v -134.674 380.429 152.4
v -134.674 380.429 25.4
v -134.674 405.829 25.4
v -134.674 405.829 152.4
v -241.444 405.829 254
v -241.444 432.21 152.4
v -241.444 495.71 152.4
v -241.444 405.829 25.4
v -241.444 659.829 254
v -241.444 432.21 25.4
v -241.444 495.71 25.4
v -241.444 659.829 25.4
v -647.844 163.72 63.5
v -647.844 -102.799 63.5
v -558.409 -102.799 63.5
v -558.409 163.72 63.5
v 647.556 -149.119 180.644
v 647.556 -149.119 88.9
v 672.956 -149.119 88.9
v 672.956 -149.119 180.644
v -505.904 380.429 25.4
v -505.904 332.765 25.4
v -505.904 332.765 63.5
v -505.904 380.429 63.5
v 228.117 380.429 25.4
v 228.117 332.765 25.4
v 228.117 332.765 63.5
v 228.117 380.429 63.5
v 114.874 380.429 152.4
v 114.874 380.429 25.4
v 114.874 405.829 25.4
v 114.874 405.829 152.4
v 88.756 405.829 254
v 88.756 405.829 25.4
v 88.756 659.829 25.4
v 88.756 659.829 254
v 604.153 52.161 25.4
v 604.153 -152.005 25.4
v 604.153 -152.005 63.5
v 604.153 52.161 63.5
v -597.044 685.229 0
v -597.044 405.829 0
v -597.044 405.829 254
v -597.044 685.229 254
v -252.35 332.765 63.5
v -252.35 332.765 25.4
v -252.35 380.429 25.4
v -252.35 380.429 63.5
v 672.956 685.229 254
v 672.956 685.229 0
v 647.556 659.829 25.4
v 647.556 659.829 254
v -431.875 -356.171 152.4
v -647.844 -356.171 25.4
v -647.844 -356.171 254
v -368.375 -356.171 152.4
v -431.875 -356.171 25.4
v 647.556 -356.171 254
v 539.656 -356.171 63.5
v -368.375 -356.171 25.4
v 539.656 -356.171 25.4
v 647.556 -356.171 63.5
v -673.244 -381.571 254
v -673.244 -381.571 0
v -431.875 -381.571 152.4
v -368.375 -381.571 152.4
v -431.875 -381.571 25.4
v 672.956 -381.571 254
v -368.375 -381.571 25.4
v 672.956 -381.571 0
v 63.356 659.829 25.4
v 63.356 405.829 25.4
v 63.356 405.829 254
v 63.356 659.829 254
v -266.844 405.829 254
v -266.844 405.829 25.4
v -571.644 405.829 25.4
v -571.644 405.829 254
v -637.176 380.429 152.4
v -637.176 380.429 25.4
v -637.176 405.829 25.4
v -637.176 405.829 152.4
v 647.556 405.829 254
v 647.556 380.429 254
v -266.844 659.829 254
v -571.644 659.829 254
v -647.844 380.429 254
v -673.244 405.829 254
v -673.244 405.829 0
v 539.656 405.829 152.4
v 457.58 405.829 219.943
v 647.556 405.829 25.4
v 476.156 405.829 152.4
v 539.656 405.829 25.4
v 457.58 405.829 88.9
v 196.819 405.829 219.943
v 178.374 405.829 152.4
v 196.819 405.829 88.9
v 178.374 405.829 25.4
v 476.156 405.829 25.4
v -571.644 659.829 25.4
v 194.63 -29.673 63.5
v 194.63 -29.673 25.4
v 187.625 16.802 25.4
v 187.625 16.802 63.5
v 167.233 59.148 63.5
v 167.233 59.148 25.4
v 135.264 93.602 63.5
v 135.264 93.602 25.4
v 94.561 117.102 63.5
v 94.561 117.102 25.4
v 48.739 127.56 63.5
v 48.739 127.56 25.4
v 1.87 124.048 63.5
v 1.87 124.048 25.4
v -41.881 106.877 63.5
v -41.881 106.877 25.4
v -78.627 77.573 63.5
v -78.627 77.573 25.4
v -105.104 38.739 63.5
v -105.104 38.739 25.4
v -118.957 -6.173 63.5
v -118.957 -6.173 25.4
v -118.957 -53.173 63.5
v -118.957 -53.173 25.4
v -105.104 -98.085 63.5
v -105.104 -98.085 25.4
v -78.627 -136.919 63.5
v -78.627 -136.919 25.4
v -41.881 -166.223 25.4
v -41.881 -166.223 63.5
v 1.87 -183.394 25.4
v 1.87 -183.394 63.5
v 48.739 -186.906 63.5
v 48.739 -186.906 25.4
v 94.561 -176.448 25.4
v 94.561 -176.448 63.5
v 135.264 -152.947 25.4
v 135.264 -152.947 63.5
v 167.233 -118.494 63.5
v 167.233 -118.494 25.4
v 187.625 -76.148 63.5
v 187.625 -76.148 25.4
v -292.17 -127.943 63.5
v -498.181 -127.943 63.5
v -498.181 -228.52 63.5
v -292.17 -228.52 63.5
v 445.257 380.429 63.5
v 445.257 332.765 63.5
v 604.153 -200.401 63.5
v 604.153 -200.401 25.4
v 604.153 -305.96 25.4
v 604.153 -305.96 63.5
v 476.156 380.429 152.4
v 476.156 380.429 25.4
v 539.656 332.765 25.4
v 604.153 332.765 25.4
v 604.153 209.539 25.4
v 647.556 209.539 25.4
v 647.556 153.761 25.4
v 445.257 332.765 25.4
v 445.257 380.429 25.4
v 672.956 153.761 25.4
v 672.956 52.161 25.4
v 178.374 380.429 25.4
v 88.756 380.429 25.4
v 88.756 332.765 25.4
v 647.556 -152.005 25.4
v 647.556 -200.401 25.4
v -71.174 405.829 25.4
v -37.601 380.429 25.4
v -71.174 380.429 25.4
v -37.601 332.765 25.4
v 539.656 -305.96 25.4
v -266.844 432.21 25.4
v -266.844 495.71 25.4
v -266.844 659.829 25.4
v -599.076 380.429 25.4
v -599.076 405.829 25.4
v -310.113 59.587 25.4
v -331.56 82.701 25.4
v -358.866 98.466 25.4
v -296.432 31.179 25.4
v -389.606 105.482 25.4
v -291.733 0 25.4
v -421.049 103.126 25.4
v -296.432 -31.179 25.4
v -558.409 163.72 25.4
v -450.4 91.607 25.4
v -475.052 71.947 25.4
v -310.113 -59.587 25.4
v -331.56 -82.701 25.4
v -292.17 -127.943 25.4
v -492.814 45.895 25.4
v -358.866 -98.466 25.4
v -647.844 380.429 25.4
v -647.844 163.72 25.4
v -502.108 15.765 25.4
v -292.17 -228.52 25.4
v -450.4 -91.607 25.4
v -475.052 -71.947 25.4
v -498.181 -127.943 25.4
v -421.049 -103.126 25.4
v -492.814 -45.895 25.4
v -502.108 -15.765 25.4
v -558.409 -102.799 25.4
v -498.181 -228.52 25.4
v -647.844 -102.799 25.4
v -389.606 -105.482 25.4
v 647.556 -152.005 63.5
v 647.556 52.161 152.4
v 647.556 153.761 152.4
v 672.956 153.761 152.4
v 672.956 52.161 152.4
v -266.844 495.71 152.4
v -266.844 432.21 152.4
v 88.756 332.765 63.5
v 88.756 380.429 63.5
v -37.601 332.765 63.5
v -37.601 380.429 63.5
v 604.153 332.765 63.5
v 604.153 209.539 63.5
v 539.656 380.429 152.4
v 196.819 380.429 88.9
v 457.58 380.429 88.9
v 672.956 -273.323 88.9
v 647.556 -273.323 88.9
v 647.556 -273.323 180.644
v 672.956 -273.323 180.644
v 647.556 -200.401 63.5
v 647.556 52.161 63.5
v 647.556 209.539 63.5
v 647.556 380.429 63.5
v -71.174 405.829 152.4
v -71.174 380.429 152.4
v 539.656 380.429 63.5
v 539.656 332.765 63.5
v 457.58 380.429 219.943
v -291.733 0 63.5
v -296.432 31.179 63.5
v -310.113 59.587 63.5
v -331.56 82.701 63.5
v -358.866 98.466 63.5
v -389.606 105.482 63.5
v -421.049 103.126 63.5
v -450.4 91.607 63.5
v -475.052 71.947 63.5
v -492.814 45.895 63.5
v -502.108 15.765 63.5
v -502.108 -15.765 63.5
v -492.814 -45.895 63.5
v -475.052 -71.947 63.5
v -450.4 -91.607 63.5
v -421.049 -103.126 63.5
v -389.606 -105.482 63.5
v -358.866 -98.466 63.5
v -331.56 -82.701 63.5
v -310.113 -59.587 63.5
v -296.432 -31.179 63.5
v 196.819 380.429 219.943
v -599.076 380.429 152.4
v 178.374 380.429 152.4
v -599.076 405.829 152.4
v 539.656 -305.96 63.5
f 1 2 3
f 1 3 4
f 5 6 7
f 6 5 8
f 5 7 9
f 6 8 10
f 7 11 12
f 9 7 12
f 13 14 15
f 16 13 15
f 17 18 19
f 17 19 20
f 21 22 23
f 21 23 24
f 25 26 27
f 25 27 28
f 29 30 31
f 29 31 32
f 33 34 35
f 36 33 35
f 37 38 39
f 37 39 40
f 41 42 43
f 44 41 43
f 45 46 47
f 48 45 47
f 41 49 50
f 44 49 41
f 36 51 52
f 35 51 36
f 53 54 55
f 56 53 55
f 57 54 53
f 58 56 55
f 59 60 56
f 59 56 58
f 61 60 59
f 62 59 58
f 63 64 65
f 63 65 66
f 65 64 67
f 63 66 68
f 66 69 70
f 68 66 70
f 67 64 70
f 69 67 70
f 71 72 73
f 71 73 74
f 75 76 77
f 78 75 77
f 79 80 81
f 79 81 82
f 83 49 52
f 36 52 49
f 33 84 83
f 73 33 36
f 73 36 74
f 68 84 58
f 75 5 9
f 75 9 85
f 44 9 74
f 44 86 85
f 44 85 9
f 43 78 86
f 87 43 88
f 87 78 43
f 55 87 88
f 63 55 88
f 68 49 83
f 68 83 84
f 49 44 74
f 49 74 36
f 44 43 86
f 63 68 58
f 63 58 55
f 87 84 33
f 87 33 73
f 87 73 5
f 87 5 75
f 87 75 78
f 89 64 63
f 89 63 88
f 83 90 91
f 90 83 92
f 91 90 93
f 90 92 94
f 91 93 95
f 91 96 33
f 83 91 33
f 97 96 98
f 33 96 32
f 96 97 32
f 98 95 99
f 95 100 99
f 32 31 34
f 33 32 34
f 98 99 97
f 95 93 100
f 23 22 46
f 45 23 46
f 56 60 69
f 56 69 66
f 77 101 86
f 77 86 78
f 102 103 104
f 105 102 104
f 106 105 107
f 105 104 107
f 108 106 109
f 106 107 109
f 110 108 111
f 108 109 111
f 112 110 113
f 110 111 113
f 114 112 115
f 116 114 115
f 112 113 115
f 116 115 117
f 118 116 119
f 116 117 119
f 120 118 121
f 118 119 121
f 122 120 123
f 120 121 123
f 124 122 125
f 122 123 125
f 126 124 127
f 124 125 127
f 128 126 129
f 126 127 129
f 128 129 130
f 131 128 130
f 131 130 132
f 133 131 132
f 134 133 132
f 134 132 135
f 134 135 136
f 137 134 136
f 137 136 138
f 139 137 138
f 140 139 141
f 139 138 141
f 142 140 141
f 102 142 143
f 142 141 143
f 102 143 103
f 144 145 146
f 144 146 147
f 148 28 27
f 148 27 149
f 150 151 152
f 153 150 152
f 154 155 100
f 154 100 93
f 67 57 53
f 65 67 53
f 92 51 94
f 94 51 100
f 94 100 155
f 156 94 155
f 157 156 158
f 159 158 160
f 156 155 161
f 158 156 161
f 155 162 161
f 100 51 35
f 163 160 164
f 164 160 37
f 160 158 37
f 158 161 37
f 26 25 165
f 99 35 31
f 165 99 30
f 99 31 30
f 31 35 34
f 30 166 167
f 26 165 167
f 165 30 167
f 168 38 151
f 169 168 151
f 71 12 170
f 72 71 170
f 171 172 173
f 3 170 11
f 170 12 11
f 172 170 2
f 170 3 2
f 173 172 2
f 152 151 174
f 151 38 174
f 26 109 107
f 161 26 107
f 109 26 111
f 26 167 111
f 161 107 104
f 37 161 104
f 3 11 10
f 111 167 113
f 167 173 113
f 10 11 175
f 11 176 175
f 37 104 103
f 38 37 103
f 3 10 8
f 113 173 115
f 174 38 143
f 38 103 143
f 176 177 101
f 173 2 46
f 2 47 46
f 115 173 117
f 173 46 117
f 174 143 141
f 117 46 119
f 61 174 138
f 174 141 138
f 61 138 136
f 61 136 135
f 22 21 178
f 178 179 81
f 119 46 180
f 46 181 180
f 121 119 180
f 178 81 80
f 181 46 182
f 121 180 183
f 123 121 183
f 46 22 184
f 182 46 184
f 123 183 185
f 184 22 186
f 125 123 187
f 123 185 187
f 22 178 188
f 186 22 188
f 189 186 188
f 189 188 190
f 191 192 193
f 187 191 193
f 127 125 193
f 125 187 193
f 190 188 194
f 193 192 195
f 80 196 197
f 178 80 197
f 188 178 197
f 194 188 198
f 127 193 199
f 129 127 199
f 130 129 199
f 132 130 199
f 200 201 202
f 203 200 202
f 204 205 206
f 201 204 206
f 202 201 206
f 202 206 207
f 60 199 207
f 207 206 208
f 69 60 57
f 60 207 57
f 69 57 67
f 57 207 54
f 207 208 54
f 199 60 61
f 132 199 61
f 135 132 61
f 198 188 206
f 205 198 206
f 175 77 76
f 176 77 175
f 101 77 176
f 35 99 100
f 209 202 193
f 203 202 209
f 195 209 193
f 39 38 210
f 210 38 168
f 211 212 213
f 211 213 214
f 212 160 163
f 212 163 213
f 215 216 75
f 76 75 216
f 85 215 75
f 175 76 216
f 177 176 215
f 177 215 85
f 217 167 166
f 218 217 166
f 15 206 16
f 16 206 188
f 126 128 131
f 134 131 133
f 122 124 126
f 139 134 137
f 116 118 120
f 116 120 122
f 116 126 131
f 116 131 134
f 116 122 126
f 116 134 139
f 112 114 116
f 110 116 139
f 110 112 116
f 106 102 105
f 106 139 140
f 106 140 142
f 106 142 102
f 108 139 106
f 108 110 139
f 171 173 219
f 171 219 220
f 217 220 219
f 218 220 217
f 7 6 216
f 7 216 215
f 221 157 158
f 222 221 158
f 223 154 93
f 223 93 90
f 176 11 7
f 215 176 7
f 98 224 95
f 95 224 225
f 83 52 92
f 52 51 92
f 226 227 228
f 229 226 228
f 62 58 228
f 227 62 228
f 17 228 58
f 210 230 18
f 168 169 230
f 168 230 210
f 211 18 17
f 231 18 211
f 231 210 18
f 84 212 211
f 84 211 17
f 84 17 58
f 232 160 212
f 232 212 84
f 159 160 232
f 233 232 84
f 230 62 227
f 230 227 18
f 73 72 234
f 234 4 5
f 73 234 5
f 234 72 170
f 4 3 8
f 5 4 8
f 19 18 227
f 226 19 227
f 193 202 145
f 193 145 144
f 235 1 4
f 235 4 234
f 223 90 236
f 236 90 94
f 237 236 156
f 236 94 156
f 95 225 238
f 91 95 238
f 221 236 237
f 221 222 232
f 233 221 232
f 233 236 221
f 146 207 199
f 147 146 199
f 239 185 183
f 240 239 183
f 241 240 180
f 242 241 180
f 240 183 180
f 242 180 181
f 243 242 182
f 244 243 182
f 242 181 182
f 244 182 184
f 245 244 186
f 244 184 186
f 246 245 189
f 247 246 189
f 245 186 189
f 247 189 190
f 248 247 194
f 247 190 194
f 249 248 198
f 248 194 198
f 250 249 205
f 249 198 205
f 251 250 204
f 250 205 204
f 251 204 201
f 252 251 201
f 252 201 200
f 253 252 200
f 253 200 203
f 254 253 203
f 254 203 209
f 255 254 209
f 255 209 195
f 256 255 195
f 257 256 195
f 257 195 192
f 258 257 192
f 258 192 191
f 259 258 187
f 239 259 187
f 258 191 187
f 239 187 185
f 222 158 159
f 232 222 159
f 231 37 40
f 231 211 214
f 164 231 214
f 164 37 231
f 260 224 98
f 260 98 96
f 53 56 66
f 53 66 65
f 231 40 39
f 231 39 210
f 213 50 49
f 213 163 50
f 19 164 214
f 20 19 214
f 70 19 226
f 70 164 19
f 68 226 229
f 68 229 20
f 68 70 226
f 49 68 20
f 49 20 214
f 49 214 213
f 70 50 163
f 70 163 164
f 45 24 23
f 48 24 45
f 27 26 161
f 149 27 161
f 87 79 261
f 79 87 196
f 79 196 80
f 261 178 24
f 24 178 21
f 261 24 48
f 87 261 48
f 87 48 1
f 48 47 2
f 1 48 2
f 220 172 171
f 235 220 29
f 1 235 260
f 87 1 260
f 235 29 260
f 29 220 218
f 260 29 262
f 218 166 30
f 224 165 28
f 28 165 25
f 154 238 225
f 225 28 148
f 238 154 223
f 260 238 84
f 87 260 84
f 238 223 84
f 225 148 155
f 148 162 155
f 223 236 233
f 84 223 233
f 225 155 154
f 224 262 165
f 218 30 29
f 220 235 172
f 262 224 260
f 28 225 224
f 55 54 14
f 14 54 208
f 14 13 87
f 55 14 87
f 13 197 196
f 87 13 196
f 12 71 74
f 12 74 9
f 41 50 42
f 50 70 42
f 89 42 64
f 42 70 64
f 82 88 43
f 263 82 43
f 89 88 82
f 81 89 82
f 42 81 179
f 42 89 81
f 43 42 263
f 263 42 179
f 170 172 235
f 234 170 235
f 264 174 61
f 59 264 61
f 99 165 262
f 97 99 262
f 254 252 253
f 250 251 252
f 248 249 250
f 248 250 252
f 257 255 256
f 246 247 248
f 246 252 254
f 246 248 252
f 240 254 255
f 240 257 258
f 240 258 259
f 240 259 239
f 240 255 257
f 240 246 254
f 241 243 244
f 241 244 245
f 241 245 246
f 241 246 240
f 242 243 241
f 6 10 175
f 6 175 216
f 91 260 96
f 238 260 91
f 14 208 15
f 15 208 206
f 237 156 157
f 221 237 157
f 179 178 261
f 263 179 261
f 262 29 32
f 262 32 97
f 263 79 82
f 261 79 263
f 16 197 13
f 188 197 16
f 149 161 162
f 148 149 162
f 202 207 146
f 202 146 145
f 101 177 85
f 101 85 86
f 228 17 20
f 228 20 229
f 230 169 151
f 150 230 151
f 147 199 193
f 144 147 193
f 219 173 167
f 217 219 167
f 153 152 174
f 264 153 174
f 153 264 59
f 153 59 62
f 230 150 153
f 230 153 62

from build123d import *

# Parameters (mm, degrees)
F0_W      = 1346.2
F0_H      = 787.4
F1_DEPTH  = 254
F2_T      = -25.4
F3_W      = 1270
F3_H      = 254
F4_DEPTH  = 279.4
F5_T      = -25.4
F6_W      = 25.4
F6_H      = 254
F7_DEPTH  = 228.6
F8_W      = 63.5
F8_H      = 127
F9_DEPTH  = 25.4
F10_W     = 25.4
F10_H     = 254
F11_DEPTH = 228.6
F12_W     = 63.5
F12_H     = 127
F13_DEPTH = 25.4
F14_W     = 63.5
F14_H     = 127
F15_DEPTH = 25.4
F16_W     = 63.5
F16_H     = 127
F17_DEPTH = 25.4
F18_W     = 101.6
F18_H     = 127
F19_DEPTH = 25.4
F20_W     = 260.761320591
F20_H     = 131.0430763721
F21_DEPTH = 25.4
F22_W     = 124.2034286261
F22_H     = 91.7437373161
F23_DEPTH = 25.4
F24_W     = 38.1
F24_H     = 127
F25_DEPTH = 25.4
F26_W     = 43.4030661404
F26_H     = 204.1662087968
F27_DEPTH = 38.1
F28_W     = 217.1396613121
F28_H     = 47.6633155483
F29_DEPTH = 38.1
F30_W     = 126.3566912651
F30_H     = 47.6633155483
F31_DEPTH = 38.1
F32_W     = 253.5540759563
F32_H     = 47.6633155483
F33_DEPTH = 38.1
F34_W     = 206.0110867023
F34_H     = 100.5776971579
F35_DEPTH = 38.1
F36_W     = 89.4355172336
F36_H     = 266.5195167065
F37_DEPTH = 38.1
F38_R     = 105.778257903
F39_DEPTH = 38.1
F40_R     = 157.6742046587
F41_DEPTH = 38.1


# Not quite as in the source:
# - a shell that OpenCascade refuses in one call is made with other operations: the cavity is built on its own and cut out


with BuildPart() as f1:
    # F0 (on Top) → F1 (new body)
    with BuildSketch(Plane.XY):
        with Locations((-0.1443736255, 12.1287457604)):
            Rectangle(F0_W, F0_H)
    extrude(amount=F1_DEPTH)

    # F2
    f2_openings = [f1.faces().sort_by_distance(p)[0] for p in [
        (-0.144374, 12.128746, 254),
    ]]
    offset(amount=F2_T, openings=f2_openings)

    # F3 (on face) → F4 (join)
    with BuildSketch(Plane(origin=(0, 405.8287457604, 0), x_dir=(-1, 0, 0), z_dir=(0, 1, 0))):
        with Locations((-37.9556263745, 127)):
            Rectangle(F3_W, F3_H)
    extrude(amount=F4_DEPTH)

    # F5: a shell. OpenCascade refuses it in one call, so the cavity is built on its own and cut out:
    # the body offset inwards by the wall thickness, plus a prism from it out through each open face.
    f5_core = offset(f1.part, amount=F5_T, kind=Kind.INTERSECTION, mode=Mode.PRIVATE)
    f5_exits = [f5_core.faces().sort_by_distance(p)[0] for p in [
        (37.955626, 532.828746, 228.6),
    ]]
    add(f5_core, mode=Mode.SUBTRACT)
    extrude(f5_exits, amount=-F5_T, mode=Mode.SUBTRACT)

    # F6 (on face) → F7 (join)
    with BuildSketch(Plane.XY.offset(25.4)):
        with Locations((-254.1443736255, 532.8287457604)):
            Rectangle(F6_W, F6_H)
    extrude(amount=F7_DEPTH)

    # F8 (on face) → F9 (cut)
    with BuildSketch(Plane.YZ.offset(-241.4443736255)):
        with Locations((463.9602367878, 88.9)):
            Rectangle(F8_W, F8_H)
    extrude(amount=-F9_DEPTH, mode=Mode.SUBTRACT)

    # F10 (on face) → F11 (join)
    with BuildSketch(Plane.XY.offset(25.4)):
        with Locations((76.0556263745, 532.8287457604)):
            Rectangle(F10_W, F10_H)
    extrude(amount=F11_DEPTH)

    # F12 (on face) → F13 (cut)
    with BuildSketch(Plane.XZ.offset(-380.4287457604)):
        with Locations((-102.9241020679, 88.9)):
            Rectangle(F12_W, F12_H)
    extrude(amount=-F13_DEPTH, mode=Mode.SUBTRACT)

    # F14 (on face) → F15 (cut)
    with BuildSketch(Plane.XZ.offset(-380.4287457604)):
        with Locations((146.6235657334, 88.9)):
            Rectangle(F14_W, F14_H)
        with Locations((507.9058175087, 88.9)):
            Rectangle(F14_W, F14_H)
    extrude(amount=-F15_DEPTH, mode=Mode.SUBTRACT)

    # F16 (on face) → F17 (cut)
    with BuildSketch(Plane(origin=(0, -356.1712542396, 0), x_dir=(-1, 0, 0), z_dir=(0, 1, 0))):
        with Locations((400.1246755123, 88.9)):
            Rectangle(F16_W, F16_H)
    extrude(amount=-F17_DEPTH, mode=Mode.SUBTRACT)

    # F18 (on face) → F19 (cut)
    with BuildSketch(Plane(origin=(647.5556263745, 0, 0), x_dir=(0, -1, 0), z_dir=(-1, 0, 0))):
        with Locations((-102.9611633539, 88.9)):
            Rectangle(F18_W, F18_H)
    extrude(amount=-F19_DEPTH, mode=Mode.SUBTRACT)

    # F20 (on face) → F21 (cut)
    with BuildSketch(Plane.XZ.offset(-380.4287457604)):
        with Locations((327.1993100643, 154.4215381861)):
            Rectangle(F20_W, F20_H)
    extrude(amount=-F21_DEPTH, mode=Mode.SUBTRACT)

    # F22 (on face) → F23 (cut)
    with BuildSketch(Plane(origin=(647.5556263745, 0, 0), x_dir=(0, -1, 0), z_dir=(-1, 0, 0))):
        with Locations((211.2211957574, 134.7718686581)):
            Rectangle(F22_W, F22_H)
    extrude(amount=-F23_DEPTH, mode=Mode.SUBTRACT)

    # F24 (on face) → F25 (cut)
    with BuildSketch(Plane.XZ.offset(-380.4287457604)):
        with Locations((-618.1262156487, 88.9)):
            Rectangle(F24_W, F24_H)
    extrude(amount=-F25_DEPTH, mode=Mode.SUBTRACT)

    # F26 (on face) → F27 (join)
    with BuildSketch(Plane.XY.offset(25.4)):
        Polygon((647.5556263745, 380.4287457604), (539.6558175087, 380.4287457604), (539.6558175087, 332.765430212), (604.1525602341, 332.765430212), (604.1525602341, 209.5392942429), (647.5556263745, 209.5392942429), align=None)
        with Locations((625.8540933043, -49.9219410445)):
            Rectangle(F26_W, F26_H)
        Polygon((647.5556263745, -356.1712542396), (647.5556263745, -200.4013210535), (604.1525602341, -200.4013210535), (604.1525602341, -305.9601783752), (539.6558175087, -305.9601783752), (539.6558175087, -356.1712542396), align=None)
    extrude(amount=F27_DEPTH)

    # F28 (on face) → F29 (join)
    with BuildSketch(Plane.XY.offset(25.4)):
        with Locations((336.6870582104, 356.5970879862)):
            Rectangle(F28_W, F28_H)
    extrude(amount=F29_DEPTH)

    # F30 (on face) → F31 (join)
    with BuildSketch(Plane.XY.offset(25.4)):
        with Locations((25.5772807419, 356.5970879862)):
            Rectangle(F30_W, F30_H)
    extrude(amount=F31_DEPTH)

    # F32 (on face) → F33 (join)
    with BuildSketch(Plane.XY.offset(25.4)):
        with Locations((-379.1270405054, 356.5970879862)):
            Rectangle(F32_W, F32_H)
    extrude(amount=F33_DEPTH)

    # F34 (on face) → F35 (join)
    with BuildSketch(Plane.XY.offset(25.4)):
        with Locations((-395.1756507158, -178.2315000892)):
            Rectangle(F34_W, F34_H)
    extrude(amount=F35_DEPTH)

    # F36 (on face) → F37 (join)
    with BuildSketch(Plane.XY.offset(25.4)):
        with Locations((-603.1266150087, 30.4604619741)):
            Rectangle(F36_W, F36_H)
    extrude(amount=F37_DEPTH)

    # F38 (on face) → F39 (join)
    with BuildSketch(Plane.XY.offset(25.4)):
        with Locations((-397.5111842155, 0)):
            Circle(F38_R)
    extrude(amount=F39_DEPTH)

    # F40 (on face) → F41 (join)
    with BuildSketch(Plane.XY.offset(25.4)):
        with Locations((36.9560047984, -29.6728350222)):
            Circle(F40_R)
    extrude(amount=F41_DEPTH)


solid = f1.part
